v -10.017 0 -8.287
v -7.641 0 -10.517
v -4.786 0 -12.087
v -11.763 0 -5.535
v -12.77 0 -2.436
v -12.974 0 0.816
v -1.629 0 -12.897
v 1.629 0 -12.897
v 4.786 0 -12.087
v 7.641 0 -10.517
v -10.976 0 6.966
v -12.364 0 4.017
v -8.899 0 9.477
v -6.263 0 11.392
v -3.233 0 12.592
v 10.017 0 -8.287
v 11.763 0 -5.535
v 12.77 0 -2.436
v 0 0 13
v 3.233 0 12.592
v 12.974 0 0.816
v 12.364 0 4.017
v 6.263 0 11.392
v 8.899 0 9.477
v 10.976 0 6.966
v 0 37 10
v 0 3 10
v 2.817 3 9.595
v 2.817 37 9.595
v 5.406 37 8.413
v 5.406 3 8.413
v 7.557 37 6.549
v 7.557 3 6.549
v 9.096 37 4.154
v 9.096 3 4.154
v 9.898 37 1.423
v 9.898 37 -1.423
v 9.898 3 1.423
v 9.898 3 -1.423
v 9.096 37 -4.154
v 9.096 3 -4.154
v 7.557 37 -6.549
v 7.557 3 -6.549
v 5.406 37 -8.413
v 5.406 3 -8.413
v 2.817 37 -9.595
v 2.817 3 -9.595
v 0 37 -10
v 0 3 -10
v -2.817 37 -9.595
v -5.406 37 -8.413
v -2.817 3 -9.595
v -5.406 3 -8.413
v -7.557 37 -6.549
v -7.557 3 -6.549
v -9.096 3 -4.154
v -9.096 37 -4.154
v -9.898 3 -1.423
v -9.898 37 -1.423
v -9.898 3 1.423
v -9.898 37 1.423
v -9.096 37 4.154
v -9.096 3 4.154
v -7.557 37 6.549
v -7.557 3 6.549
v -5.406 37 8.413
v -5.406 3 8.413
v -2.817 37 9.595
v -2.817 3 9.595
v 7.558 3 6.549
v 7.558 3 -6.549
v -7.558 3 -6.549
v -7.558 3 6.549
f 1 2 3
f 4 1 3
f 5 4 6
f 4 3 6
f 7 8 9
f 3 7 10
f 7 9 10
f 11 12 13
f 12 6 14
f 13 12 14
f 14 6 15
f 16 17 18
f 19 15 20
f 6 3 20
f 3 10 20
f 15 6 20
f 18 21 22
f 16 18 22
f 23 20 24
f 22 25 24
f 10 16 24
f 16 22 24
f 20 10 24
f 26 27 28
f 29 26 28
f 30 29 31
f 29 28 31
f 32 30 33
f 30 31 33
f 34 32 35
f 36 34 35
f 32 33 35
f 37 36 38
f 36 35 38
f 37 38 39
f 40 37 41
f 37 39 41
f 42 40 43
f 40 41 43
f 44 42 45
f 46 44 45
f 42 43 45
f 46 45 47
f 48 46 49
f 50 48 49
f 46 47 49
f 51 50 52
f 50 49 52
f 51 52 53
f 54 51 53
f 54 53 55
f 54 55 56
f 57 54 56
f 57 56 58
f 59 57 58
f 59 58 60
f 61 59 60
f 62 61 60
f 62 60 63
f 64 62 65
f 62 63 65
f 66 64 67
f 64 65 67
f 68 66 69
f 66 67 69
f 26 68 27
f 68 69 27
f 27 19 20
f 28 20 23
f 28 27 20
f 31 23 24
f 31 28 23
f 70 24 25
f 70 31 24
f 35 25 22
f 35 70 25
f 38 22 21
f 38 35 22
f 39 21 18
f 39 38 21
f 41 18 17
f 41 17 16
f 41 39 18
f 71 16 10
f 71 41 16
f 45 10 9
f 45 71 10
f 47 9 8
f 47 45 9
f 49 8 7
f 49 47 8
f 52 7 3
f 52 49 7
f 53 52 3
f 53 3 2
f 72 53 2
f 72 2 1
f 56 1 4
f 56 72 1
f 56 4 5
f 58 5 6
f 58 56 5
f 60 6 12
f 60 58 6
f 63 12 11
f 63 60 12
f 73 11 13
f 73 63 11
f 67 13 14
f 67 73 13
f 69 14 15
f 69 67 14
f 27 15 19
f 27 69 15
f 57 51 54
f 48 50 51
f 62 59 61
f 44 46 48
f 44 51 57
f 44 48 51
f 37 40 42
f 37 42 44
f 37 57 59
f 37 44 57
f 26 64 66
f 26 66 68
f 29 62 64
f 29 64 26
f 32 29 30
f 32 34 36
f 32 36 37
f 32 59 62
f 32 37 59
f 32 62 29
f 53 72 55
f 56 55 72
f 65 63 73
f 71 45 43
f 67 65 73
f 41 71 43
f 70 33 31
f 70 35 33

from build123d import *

# Parameters (mm, degrees)
ESQUISSE1_R        = 13
BOSS_EXTRU_3_DEPTH = 3
CHANFREIN2_SIZE    = 3
ESQUISSE3_R        = 10
BOSS_EXTRU_4_DEPTH = 34


with BuildPart() as part:
    # Esquisse1 → Boss.-Extru.3 (new body)
    with BuildSketch(Plane(origin=(0, 0, 0), x_dir=(1, 0, 0), z_dir=(0, 1, 0))):
        with Locations(Location((0, 0, 0), (0, 0, 270))):
            Circle(ESQUISSE1_R)
    extrude(amount=BOSS_EXTRU_3_DEPTH)

    # Chanfrein2
    chanfrein2_edges = [part.edges().sort_by_distance(p)[0] for p in [
        (0, 3, -13),
    ]]
    chamfer(chanfrein2_edges, length=CHANFREIN2_SIZE - 0.0001)  # a hair under: the kernel refuses the full size

    # Esquisse3 → Boss.-Extru.4 (add)
    with BuildSketch(Plane(origin=(0, 3, 0), x_dir=(1, 0, 0), z_dir=(0, 1, 0))):
        with Locations(Location((0, 0, 0), (0, 0, 270))):
            Circle(ESQUISSE3_R)
    extrude(amount=BOSS_EXTRU_4_DEPTH)


solid = part.part
